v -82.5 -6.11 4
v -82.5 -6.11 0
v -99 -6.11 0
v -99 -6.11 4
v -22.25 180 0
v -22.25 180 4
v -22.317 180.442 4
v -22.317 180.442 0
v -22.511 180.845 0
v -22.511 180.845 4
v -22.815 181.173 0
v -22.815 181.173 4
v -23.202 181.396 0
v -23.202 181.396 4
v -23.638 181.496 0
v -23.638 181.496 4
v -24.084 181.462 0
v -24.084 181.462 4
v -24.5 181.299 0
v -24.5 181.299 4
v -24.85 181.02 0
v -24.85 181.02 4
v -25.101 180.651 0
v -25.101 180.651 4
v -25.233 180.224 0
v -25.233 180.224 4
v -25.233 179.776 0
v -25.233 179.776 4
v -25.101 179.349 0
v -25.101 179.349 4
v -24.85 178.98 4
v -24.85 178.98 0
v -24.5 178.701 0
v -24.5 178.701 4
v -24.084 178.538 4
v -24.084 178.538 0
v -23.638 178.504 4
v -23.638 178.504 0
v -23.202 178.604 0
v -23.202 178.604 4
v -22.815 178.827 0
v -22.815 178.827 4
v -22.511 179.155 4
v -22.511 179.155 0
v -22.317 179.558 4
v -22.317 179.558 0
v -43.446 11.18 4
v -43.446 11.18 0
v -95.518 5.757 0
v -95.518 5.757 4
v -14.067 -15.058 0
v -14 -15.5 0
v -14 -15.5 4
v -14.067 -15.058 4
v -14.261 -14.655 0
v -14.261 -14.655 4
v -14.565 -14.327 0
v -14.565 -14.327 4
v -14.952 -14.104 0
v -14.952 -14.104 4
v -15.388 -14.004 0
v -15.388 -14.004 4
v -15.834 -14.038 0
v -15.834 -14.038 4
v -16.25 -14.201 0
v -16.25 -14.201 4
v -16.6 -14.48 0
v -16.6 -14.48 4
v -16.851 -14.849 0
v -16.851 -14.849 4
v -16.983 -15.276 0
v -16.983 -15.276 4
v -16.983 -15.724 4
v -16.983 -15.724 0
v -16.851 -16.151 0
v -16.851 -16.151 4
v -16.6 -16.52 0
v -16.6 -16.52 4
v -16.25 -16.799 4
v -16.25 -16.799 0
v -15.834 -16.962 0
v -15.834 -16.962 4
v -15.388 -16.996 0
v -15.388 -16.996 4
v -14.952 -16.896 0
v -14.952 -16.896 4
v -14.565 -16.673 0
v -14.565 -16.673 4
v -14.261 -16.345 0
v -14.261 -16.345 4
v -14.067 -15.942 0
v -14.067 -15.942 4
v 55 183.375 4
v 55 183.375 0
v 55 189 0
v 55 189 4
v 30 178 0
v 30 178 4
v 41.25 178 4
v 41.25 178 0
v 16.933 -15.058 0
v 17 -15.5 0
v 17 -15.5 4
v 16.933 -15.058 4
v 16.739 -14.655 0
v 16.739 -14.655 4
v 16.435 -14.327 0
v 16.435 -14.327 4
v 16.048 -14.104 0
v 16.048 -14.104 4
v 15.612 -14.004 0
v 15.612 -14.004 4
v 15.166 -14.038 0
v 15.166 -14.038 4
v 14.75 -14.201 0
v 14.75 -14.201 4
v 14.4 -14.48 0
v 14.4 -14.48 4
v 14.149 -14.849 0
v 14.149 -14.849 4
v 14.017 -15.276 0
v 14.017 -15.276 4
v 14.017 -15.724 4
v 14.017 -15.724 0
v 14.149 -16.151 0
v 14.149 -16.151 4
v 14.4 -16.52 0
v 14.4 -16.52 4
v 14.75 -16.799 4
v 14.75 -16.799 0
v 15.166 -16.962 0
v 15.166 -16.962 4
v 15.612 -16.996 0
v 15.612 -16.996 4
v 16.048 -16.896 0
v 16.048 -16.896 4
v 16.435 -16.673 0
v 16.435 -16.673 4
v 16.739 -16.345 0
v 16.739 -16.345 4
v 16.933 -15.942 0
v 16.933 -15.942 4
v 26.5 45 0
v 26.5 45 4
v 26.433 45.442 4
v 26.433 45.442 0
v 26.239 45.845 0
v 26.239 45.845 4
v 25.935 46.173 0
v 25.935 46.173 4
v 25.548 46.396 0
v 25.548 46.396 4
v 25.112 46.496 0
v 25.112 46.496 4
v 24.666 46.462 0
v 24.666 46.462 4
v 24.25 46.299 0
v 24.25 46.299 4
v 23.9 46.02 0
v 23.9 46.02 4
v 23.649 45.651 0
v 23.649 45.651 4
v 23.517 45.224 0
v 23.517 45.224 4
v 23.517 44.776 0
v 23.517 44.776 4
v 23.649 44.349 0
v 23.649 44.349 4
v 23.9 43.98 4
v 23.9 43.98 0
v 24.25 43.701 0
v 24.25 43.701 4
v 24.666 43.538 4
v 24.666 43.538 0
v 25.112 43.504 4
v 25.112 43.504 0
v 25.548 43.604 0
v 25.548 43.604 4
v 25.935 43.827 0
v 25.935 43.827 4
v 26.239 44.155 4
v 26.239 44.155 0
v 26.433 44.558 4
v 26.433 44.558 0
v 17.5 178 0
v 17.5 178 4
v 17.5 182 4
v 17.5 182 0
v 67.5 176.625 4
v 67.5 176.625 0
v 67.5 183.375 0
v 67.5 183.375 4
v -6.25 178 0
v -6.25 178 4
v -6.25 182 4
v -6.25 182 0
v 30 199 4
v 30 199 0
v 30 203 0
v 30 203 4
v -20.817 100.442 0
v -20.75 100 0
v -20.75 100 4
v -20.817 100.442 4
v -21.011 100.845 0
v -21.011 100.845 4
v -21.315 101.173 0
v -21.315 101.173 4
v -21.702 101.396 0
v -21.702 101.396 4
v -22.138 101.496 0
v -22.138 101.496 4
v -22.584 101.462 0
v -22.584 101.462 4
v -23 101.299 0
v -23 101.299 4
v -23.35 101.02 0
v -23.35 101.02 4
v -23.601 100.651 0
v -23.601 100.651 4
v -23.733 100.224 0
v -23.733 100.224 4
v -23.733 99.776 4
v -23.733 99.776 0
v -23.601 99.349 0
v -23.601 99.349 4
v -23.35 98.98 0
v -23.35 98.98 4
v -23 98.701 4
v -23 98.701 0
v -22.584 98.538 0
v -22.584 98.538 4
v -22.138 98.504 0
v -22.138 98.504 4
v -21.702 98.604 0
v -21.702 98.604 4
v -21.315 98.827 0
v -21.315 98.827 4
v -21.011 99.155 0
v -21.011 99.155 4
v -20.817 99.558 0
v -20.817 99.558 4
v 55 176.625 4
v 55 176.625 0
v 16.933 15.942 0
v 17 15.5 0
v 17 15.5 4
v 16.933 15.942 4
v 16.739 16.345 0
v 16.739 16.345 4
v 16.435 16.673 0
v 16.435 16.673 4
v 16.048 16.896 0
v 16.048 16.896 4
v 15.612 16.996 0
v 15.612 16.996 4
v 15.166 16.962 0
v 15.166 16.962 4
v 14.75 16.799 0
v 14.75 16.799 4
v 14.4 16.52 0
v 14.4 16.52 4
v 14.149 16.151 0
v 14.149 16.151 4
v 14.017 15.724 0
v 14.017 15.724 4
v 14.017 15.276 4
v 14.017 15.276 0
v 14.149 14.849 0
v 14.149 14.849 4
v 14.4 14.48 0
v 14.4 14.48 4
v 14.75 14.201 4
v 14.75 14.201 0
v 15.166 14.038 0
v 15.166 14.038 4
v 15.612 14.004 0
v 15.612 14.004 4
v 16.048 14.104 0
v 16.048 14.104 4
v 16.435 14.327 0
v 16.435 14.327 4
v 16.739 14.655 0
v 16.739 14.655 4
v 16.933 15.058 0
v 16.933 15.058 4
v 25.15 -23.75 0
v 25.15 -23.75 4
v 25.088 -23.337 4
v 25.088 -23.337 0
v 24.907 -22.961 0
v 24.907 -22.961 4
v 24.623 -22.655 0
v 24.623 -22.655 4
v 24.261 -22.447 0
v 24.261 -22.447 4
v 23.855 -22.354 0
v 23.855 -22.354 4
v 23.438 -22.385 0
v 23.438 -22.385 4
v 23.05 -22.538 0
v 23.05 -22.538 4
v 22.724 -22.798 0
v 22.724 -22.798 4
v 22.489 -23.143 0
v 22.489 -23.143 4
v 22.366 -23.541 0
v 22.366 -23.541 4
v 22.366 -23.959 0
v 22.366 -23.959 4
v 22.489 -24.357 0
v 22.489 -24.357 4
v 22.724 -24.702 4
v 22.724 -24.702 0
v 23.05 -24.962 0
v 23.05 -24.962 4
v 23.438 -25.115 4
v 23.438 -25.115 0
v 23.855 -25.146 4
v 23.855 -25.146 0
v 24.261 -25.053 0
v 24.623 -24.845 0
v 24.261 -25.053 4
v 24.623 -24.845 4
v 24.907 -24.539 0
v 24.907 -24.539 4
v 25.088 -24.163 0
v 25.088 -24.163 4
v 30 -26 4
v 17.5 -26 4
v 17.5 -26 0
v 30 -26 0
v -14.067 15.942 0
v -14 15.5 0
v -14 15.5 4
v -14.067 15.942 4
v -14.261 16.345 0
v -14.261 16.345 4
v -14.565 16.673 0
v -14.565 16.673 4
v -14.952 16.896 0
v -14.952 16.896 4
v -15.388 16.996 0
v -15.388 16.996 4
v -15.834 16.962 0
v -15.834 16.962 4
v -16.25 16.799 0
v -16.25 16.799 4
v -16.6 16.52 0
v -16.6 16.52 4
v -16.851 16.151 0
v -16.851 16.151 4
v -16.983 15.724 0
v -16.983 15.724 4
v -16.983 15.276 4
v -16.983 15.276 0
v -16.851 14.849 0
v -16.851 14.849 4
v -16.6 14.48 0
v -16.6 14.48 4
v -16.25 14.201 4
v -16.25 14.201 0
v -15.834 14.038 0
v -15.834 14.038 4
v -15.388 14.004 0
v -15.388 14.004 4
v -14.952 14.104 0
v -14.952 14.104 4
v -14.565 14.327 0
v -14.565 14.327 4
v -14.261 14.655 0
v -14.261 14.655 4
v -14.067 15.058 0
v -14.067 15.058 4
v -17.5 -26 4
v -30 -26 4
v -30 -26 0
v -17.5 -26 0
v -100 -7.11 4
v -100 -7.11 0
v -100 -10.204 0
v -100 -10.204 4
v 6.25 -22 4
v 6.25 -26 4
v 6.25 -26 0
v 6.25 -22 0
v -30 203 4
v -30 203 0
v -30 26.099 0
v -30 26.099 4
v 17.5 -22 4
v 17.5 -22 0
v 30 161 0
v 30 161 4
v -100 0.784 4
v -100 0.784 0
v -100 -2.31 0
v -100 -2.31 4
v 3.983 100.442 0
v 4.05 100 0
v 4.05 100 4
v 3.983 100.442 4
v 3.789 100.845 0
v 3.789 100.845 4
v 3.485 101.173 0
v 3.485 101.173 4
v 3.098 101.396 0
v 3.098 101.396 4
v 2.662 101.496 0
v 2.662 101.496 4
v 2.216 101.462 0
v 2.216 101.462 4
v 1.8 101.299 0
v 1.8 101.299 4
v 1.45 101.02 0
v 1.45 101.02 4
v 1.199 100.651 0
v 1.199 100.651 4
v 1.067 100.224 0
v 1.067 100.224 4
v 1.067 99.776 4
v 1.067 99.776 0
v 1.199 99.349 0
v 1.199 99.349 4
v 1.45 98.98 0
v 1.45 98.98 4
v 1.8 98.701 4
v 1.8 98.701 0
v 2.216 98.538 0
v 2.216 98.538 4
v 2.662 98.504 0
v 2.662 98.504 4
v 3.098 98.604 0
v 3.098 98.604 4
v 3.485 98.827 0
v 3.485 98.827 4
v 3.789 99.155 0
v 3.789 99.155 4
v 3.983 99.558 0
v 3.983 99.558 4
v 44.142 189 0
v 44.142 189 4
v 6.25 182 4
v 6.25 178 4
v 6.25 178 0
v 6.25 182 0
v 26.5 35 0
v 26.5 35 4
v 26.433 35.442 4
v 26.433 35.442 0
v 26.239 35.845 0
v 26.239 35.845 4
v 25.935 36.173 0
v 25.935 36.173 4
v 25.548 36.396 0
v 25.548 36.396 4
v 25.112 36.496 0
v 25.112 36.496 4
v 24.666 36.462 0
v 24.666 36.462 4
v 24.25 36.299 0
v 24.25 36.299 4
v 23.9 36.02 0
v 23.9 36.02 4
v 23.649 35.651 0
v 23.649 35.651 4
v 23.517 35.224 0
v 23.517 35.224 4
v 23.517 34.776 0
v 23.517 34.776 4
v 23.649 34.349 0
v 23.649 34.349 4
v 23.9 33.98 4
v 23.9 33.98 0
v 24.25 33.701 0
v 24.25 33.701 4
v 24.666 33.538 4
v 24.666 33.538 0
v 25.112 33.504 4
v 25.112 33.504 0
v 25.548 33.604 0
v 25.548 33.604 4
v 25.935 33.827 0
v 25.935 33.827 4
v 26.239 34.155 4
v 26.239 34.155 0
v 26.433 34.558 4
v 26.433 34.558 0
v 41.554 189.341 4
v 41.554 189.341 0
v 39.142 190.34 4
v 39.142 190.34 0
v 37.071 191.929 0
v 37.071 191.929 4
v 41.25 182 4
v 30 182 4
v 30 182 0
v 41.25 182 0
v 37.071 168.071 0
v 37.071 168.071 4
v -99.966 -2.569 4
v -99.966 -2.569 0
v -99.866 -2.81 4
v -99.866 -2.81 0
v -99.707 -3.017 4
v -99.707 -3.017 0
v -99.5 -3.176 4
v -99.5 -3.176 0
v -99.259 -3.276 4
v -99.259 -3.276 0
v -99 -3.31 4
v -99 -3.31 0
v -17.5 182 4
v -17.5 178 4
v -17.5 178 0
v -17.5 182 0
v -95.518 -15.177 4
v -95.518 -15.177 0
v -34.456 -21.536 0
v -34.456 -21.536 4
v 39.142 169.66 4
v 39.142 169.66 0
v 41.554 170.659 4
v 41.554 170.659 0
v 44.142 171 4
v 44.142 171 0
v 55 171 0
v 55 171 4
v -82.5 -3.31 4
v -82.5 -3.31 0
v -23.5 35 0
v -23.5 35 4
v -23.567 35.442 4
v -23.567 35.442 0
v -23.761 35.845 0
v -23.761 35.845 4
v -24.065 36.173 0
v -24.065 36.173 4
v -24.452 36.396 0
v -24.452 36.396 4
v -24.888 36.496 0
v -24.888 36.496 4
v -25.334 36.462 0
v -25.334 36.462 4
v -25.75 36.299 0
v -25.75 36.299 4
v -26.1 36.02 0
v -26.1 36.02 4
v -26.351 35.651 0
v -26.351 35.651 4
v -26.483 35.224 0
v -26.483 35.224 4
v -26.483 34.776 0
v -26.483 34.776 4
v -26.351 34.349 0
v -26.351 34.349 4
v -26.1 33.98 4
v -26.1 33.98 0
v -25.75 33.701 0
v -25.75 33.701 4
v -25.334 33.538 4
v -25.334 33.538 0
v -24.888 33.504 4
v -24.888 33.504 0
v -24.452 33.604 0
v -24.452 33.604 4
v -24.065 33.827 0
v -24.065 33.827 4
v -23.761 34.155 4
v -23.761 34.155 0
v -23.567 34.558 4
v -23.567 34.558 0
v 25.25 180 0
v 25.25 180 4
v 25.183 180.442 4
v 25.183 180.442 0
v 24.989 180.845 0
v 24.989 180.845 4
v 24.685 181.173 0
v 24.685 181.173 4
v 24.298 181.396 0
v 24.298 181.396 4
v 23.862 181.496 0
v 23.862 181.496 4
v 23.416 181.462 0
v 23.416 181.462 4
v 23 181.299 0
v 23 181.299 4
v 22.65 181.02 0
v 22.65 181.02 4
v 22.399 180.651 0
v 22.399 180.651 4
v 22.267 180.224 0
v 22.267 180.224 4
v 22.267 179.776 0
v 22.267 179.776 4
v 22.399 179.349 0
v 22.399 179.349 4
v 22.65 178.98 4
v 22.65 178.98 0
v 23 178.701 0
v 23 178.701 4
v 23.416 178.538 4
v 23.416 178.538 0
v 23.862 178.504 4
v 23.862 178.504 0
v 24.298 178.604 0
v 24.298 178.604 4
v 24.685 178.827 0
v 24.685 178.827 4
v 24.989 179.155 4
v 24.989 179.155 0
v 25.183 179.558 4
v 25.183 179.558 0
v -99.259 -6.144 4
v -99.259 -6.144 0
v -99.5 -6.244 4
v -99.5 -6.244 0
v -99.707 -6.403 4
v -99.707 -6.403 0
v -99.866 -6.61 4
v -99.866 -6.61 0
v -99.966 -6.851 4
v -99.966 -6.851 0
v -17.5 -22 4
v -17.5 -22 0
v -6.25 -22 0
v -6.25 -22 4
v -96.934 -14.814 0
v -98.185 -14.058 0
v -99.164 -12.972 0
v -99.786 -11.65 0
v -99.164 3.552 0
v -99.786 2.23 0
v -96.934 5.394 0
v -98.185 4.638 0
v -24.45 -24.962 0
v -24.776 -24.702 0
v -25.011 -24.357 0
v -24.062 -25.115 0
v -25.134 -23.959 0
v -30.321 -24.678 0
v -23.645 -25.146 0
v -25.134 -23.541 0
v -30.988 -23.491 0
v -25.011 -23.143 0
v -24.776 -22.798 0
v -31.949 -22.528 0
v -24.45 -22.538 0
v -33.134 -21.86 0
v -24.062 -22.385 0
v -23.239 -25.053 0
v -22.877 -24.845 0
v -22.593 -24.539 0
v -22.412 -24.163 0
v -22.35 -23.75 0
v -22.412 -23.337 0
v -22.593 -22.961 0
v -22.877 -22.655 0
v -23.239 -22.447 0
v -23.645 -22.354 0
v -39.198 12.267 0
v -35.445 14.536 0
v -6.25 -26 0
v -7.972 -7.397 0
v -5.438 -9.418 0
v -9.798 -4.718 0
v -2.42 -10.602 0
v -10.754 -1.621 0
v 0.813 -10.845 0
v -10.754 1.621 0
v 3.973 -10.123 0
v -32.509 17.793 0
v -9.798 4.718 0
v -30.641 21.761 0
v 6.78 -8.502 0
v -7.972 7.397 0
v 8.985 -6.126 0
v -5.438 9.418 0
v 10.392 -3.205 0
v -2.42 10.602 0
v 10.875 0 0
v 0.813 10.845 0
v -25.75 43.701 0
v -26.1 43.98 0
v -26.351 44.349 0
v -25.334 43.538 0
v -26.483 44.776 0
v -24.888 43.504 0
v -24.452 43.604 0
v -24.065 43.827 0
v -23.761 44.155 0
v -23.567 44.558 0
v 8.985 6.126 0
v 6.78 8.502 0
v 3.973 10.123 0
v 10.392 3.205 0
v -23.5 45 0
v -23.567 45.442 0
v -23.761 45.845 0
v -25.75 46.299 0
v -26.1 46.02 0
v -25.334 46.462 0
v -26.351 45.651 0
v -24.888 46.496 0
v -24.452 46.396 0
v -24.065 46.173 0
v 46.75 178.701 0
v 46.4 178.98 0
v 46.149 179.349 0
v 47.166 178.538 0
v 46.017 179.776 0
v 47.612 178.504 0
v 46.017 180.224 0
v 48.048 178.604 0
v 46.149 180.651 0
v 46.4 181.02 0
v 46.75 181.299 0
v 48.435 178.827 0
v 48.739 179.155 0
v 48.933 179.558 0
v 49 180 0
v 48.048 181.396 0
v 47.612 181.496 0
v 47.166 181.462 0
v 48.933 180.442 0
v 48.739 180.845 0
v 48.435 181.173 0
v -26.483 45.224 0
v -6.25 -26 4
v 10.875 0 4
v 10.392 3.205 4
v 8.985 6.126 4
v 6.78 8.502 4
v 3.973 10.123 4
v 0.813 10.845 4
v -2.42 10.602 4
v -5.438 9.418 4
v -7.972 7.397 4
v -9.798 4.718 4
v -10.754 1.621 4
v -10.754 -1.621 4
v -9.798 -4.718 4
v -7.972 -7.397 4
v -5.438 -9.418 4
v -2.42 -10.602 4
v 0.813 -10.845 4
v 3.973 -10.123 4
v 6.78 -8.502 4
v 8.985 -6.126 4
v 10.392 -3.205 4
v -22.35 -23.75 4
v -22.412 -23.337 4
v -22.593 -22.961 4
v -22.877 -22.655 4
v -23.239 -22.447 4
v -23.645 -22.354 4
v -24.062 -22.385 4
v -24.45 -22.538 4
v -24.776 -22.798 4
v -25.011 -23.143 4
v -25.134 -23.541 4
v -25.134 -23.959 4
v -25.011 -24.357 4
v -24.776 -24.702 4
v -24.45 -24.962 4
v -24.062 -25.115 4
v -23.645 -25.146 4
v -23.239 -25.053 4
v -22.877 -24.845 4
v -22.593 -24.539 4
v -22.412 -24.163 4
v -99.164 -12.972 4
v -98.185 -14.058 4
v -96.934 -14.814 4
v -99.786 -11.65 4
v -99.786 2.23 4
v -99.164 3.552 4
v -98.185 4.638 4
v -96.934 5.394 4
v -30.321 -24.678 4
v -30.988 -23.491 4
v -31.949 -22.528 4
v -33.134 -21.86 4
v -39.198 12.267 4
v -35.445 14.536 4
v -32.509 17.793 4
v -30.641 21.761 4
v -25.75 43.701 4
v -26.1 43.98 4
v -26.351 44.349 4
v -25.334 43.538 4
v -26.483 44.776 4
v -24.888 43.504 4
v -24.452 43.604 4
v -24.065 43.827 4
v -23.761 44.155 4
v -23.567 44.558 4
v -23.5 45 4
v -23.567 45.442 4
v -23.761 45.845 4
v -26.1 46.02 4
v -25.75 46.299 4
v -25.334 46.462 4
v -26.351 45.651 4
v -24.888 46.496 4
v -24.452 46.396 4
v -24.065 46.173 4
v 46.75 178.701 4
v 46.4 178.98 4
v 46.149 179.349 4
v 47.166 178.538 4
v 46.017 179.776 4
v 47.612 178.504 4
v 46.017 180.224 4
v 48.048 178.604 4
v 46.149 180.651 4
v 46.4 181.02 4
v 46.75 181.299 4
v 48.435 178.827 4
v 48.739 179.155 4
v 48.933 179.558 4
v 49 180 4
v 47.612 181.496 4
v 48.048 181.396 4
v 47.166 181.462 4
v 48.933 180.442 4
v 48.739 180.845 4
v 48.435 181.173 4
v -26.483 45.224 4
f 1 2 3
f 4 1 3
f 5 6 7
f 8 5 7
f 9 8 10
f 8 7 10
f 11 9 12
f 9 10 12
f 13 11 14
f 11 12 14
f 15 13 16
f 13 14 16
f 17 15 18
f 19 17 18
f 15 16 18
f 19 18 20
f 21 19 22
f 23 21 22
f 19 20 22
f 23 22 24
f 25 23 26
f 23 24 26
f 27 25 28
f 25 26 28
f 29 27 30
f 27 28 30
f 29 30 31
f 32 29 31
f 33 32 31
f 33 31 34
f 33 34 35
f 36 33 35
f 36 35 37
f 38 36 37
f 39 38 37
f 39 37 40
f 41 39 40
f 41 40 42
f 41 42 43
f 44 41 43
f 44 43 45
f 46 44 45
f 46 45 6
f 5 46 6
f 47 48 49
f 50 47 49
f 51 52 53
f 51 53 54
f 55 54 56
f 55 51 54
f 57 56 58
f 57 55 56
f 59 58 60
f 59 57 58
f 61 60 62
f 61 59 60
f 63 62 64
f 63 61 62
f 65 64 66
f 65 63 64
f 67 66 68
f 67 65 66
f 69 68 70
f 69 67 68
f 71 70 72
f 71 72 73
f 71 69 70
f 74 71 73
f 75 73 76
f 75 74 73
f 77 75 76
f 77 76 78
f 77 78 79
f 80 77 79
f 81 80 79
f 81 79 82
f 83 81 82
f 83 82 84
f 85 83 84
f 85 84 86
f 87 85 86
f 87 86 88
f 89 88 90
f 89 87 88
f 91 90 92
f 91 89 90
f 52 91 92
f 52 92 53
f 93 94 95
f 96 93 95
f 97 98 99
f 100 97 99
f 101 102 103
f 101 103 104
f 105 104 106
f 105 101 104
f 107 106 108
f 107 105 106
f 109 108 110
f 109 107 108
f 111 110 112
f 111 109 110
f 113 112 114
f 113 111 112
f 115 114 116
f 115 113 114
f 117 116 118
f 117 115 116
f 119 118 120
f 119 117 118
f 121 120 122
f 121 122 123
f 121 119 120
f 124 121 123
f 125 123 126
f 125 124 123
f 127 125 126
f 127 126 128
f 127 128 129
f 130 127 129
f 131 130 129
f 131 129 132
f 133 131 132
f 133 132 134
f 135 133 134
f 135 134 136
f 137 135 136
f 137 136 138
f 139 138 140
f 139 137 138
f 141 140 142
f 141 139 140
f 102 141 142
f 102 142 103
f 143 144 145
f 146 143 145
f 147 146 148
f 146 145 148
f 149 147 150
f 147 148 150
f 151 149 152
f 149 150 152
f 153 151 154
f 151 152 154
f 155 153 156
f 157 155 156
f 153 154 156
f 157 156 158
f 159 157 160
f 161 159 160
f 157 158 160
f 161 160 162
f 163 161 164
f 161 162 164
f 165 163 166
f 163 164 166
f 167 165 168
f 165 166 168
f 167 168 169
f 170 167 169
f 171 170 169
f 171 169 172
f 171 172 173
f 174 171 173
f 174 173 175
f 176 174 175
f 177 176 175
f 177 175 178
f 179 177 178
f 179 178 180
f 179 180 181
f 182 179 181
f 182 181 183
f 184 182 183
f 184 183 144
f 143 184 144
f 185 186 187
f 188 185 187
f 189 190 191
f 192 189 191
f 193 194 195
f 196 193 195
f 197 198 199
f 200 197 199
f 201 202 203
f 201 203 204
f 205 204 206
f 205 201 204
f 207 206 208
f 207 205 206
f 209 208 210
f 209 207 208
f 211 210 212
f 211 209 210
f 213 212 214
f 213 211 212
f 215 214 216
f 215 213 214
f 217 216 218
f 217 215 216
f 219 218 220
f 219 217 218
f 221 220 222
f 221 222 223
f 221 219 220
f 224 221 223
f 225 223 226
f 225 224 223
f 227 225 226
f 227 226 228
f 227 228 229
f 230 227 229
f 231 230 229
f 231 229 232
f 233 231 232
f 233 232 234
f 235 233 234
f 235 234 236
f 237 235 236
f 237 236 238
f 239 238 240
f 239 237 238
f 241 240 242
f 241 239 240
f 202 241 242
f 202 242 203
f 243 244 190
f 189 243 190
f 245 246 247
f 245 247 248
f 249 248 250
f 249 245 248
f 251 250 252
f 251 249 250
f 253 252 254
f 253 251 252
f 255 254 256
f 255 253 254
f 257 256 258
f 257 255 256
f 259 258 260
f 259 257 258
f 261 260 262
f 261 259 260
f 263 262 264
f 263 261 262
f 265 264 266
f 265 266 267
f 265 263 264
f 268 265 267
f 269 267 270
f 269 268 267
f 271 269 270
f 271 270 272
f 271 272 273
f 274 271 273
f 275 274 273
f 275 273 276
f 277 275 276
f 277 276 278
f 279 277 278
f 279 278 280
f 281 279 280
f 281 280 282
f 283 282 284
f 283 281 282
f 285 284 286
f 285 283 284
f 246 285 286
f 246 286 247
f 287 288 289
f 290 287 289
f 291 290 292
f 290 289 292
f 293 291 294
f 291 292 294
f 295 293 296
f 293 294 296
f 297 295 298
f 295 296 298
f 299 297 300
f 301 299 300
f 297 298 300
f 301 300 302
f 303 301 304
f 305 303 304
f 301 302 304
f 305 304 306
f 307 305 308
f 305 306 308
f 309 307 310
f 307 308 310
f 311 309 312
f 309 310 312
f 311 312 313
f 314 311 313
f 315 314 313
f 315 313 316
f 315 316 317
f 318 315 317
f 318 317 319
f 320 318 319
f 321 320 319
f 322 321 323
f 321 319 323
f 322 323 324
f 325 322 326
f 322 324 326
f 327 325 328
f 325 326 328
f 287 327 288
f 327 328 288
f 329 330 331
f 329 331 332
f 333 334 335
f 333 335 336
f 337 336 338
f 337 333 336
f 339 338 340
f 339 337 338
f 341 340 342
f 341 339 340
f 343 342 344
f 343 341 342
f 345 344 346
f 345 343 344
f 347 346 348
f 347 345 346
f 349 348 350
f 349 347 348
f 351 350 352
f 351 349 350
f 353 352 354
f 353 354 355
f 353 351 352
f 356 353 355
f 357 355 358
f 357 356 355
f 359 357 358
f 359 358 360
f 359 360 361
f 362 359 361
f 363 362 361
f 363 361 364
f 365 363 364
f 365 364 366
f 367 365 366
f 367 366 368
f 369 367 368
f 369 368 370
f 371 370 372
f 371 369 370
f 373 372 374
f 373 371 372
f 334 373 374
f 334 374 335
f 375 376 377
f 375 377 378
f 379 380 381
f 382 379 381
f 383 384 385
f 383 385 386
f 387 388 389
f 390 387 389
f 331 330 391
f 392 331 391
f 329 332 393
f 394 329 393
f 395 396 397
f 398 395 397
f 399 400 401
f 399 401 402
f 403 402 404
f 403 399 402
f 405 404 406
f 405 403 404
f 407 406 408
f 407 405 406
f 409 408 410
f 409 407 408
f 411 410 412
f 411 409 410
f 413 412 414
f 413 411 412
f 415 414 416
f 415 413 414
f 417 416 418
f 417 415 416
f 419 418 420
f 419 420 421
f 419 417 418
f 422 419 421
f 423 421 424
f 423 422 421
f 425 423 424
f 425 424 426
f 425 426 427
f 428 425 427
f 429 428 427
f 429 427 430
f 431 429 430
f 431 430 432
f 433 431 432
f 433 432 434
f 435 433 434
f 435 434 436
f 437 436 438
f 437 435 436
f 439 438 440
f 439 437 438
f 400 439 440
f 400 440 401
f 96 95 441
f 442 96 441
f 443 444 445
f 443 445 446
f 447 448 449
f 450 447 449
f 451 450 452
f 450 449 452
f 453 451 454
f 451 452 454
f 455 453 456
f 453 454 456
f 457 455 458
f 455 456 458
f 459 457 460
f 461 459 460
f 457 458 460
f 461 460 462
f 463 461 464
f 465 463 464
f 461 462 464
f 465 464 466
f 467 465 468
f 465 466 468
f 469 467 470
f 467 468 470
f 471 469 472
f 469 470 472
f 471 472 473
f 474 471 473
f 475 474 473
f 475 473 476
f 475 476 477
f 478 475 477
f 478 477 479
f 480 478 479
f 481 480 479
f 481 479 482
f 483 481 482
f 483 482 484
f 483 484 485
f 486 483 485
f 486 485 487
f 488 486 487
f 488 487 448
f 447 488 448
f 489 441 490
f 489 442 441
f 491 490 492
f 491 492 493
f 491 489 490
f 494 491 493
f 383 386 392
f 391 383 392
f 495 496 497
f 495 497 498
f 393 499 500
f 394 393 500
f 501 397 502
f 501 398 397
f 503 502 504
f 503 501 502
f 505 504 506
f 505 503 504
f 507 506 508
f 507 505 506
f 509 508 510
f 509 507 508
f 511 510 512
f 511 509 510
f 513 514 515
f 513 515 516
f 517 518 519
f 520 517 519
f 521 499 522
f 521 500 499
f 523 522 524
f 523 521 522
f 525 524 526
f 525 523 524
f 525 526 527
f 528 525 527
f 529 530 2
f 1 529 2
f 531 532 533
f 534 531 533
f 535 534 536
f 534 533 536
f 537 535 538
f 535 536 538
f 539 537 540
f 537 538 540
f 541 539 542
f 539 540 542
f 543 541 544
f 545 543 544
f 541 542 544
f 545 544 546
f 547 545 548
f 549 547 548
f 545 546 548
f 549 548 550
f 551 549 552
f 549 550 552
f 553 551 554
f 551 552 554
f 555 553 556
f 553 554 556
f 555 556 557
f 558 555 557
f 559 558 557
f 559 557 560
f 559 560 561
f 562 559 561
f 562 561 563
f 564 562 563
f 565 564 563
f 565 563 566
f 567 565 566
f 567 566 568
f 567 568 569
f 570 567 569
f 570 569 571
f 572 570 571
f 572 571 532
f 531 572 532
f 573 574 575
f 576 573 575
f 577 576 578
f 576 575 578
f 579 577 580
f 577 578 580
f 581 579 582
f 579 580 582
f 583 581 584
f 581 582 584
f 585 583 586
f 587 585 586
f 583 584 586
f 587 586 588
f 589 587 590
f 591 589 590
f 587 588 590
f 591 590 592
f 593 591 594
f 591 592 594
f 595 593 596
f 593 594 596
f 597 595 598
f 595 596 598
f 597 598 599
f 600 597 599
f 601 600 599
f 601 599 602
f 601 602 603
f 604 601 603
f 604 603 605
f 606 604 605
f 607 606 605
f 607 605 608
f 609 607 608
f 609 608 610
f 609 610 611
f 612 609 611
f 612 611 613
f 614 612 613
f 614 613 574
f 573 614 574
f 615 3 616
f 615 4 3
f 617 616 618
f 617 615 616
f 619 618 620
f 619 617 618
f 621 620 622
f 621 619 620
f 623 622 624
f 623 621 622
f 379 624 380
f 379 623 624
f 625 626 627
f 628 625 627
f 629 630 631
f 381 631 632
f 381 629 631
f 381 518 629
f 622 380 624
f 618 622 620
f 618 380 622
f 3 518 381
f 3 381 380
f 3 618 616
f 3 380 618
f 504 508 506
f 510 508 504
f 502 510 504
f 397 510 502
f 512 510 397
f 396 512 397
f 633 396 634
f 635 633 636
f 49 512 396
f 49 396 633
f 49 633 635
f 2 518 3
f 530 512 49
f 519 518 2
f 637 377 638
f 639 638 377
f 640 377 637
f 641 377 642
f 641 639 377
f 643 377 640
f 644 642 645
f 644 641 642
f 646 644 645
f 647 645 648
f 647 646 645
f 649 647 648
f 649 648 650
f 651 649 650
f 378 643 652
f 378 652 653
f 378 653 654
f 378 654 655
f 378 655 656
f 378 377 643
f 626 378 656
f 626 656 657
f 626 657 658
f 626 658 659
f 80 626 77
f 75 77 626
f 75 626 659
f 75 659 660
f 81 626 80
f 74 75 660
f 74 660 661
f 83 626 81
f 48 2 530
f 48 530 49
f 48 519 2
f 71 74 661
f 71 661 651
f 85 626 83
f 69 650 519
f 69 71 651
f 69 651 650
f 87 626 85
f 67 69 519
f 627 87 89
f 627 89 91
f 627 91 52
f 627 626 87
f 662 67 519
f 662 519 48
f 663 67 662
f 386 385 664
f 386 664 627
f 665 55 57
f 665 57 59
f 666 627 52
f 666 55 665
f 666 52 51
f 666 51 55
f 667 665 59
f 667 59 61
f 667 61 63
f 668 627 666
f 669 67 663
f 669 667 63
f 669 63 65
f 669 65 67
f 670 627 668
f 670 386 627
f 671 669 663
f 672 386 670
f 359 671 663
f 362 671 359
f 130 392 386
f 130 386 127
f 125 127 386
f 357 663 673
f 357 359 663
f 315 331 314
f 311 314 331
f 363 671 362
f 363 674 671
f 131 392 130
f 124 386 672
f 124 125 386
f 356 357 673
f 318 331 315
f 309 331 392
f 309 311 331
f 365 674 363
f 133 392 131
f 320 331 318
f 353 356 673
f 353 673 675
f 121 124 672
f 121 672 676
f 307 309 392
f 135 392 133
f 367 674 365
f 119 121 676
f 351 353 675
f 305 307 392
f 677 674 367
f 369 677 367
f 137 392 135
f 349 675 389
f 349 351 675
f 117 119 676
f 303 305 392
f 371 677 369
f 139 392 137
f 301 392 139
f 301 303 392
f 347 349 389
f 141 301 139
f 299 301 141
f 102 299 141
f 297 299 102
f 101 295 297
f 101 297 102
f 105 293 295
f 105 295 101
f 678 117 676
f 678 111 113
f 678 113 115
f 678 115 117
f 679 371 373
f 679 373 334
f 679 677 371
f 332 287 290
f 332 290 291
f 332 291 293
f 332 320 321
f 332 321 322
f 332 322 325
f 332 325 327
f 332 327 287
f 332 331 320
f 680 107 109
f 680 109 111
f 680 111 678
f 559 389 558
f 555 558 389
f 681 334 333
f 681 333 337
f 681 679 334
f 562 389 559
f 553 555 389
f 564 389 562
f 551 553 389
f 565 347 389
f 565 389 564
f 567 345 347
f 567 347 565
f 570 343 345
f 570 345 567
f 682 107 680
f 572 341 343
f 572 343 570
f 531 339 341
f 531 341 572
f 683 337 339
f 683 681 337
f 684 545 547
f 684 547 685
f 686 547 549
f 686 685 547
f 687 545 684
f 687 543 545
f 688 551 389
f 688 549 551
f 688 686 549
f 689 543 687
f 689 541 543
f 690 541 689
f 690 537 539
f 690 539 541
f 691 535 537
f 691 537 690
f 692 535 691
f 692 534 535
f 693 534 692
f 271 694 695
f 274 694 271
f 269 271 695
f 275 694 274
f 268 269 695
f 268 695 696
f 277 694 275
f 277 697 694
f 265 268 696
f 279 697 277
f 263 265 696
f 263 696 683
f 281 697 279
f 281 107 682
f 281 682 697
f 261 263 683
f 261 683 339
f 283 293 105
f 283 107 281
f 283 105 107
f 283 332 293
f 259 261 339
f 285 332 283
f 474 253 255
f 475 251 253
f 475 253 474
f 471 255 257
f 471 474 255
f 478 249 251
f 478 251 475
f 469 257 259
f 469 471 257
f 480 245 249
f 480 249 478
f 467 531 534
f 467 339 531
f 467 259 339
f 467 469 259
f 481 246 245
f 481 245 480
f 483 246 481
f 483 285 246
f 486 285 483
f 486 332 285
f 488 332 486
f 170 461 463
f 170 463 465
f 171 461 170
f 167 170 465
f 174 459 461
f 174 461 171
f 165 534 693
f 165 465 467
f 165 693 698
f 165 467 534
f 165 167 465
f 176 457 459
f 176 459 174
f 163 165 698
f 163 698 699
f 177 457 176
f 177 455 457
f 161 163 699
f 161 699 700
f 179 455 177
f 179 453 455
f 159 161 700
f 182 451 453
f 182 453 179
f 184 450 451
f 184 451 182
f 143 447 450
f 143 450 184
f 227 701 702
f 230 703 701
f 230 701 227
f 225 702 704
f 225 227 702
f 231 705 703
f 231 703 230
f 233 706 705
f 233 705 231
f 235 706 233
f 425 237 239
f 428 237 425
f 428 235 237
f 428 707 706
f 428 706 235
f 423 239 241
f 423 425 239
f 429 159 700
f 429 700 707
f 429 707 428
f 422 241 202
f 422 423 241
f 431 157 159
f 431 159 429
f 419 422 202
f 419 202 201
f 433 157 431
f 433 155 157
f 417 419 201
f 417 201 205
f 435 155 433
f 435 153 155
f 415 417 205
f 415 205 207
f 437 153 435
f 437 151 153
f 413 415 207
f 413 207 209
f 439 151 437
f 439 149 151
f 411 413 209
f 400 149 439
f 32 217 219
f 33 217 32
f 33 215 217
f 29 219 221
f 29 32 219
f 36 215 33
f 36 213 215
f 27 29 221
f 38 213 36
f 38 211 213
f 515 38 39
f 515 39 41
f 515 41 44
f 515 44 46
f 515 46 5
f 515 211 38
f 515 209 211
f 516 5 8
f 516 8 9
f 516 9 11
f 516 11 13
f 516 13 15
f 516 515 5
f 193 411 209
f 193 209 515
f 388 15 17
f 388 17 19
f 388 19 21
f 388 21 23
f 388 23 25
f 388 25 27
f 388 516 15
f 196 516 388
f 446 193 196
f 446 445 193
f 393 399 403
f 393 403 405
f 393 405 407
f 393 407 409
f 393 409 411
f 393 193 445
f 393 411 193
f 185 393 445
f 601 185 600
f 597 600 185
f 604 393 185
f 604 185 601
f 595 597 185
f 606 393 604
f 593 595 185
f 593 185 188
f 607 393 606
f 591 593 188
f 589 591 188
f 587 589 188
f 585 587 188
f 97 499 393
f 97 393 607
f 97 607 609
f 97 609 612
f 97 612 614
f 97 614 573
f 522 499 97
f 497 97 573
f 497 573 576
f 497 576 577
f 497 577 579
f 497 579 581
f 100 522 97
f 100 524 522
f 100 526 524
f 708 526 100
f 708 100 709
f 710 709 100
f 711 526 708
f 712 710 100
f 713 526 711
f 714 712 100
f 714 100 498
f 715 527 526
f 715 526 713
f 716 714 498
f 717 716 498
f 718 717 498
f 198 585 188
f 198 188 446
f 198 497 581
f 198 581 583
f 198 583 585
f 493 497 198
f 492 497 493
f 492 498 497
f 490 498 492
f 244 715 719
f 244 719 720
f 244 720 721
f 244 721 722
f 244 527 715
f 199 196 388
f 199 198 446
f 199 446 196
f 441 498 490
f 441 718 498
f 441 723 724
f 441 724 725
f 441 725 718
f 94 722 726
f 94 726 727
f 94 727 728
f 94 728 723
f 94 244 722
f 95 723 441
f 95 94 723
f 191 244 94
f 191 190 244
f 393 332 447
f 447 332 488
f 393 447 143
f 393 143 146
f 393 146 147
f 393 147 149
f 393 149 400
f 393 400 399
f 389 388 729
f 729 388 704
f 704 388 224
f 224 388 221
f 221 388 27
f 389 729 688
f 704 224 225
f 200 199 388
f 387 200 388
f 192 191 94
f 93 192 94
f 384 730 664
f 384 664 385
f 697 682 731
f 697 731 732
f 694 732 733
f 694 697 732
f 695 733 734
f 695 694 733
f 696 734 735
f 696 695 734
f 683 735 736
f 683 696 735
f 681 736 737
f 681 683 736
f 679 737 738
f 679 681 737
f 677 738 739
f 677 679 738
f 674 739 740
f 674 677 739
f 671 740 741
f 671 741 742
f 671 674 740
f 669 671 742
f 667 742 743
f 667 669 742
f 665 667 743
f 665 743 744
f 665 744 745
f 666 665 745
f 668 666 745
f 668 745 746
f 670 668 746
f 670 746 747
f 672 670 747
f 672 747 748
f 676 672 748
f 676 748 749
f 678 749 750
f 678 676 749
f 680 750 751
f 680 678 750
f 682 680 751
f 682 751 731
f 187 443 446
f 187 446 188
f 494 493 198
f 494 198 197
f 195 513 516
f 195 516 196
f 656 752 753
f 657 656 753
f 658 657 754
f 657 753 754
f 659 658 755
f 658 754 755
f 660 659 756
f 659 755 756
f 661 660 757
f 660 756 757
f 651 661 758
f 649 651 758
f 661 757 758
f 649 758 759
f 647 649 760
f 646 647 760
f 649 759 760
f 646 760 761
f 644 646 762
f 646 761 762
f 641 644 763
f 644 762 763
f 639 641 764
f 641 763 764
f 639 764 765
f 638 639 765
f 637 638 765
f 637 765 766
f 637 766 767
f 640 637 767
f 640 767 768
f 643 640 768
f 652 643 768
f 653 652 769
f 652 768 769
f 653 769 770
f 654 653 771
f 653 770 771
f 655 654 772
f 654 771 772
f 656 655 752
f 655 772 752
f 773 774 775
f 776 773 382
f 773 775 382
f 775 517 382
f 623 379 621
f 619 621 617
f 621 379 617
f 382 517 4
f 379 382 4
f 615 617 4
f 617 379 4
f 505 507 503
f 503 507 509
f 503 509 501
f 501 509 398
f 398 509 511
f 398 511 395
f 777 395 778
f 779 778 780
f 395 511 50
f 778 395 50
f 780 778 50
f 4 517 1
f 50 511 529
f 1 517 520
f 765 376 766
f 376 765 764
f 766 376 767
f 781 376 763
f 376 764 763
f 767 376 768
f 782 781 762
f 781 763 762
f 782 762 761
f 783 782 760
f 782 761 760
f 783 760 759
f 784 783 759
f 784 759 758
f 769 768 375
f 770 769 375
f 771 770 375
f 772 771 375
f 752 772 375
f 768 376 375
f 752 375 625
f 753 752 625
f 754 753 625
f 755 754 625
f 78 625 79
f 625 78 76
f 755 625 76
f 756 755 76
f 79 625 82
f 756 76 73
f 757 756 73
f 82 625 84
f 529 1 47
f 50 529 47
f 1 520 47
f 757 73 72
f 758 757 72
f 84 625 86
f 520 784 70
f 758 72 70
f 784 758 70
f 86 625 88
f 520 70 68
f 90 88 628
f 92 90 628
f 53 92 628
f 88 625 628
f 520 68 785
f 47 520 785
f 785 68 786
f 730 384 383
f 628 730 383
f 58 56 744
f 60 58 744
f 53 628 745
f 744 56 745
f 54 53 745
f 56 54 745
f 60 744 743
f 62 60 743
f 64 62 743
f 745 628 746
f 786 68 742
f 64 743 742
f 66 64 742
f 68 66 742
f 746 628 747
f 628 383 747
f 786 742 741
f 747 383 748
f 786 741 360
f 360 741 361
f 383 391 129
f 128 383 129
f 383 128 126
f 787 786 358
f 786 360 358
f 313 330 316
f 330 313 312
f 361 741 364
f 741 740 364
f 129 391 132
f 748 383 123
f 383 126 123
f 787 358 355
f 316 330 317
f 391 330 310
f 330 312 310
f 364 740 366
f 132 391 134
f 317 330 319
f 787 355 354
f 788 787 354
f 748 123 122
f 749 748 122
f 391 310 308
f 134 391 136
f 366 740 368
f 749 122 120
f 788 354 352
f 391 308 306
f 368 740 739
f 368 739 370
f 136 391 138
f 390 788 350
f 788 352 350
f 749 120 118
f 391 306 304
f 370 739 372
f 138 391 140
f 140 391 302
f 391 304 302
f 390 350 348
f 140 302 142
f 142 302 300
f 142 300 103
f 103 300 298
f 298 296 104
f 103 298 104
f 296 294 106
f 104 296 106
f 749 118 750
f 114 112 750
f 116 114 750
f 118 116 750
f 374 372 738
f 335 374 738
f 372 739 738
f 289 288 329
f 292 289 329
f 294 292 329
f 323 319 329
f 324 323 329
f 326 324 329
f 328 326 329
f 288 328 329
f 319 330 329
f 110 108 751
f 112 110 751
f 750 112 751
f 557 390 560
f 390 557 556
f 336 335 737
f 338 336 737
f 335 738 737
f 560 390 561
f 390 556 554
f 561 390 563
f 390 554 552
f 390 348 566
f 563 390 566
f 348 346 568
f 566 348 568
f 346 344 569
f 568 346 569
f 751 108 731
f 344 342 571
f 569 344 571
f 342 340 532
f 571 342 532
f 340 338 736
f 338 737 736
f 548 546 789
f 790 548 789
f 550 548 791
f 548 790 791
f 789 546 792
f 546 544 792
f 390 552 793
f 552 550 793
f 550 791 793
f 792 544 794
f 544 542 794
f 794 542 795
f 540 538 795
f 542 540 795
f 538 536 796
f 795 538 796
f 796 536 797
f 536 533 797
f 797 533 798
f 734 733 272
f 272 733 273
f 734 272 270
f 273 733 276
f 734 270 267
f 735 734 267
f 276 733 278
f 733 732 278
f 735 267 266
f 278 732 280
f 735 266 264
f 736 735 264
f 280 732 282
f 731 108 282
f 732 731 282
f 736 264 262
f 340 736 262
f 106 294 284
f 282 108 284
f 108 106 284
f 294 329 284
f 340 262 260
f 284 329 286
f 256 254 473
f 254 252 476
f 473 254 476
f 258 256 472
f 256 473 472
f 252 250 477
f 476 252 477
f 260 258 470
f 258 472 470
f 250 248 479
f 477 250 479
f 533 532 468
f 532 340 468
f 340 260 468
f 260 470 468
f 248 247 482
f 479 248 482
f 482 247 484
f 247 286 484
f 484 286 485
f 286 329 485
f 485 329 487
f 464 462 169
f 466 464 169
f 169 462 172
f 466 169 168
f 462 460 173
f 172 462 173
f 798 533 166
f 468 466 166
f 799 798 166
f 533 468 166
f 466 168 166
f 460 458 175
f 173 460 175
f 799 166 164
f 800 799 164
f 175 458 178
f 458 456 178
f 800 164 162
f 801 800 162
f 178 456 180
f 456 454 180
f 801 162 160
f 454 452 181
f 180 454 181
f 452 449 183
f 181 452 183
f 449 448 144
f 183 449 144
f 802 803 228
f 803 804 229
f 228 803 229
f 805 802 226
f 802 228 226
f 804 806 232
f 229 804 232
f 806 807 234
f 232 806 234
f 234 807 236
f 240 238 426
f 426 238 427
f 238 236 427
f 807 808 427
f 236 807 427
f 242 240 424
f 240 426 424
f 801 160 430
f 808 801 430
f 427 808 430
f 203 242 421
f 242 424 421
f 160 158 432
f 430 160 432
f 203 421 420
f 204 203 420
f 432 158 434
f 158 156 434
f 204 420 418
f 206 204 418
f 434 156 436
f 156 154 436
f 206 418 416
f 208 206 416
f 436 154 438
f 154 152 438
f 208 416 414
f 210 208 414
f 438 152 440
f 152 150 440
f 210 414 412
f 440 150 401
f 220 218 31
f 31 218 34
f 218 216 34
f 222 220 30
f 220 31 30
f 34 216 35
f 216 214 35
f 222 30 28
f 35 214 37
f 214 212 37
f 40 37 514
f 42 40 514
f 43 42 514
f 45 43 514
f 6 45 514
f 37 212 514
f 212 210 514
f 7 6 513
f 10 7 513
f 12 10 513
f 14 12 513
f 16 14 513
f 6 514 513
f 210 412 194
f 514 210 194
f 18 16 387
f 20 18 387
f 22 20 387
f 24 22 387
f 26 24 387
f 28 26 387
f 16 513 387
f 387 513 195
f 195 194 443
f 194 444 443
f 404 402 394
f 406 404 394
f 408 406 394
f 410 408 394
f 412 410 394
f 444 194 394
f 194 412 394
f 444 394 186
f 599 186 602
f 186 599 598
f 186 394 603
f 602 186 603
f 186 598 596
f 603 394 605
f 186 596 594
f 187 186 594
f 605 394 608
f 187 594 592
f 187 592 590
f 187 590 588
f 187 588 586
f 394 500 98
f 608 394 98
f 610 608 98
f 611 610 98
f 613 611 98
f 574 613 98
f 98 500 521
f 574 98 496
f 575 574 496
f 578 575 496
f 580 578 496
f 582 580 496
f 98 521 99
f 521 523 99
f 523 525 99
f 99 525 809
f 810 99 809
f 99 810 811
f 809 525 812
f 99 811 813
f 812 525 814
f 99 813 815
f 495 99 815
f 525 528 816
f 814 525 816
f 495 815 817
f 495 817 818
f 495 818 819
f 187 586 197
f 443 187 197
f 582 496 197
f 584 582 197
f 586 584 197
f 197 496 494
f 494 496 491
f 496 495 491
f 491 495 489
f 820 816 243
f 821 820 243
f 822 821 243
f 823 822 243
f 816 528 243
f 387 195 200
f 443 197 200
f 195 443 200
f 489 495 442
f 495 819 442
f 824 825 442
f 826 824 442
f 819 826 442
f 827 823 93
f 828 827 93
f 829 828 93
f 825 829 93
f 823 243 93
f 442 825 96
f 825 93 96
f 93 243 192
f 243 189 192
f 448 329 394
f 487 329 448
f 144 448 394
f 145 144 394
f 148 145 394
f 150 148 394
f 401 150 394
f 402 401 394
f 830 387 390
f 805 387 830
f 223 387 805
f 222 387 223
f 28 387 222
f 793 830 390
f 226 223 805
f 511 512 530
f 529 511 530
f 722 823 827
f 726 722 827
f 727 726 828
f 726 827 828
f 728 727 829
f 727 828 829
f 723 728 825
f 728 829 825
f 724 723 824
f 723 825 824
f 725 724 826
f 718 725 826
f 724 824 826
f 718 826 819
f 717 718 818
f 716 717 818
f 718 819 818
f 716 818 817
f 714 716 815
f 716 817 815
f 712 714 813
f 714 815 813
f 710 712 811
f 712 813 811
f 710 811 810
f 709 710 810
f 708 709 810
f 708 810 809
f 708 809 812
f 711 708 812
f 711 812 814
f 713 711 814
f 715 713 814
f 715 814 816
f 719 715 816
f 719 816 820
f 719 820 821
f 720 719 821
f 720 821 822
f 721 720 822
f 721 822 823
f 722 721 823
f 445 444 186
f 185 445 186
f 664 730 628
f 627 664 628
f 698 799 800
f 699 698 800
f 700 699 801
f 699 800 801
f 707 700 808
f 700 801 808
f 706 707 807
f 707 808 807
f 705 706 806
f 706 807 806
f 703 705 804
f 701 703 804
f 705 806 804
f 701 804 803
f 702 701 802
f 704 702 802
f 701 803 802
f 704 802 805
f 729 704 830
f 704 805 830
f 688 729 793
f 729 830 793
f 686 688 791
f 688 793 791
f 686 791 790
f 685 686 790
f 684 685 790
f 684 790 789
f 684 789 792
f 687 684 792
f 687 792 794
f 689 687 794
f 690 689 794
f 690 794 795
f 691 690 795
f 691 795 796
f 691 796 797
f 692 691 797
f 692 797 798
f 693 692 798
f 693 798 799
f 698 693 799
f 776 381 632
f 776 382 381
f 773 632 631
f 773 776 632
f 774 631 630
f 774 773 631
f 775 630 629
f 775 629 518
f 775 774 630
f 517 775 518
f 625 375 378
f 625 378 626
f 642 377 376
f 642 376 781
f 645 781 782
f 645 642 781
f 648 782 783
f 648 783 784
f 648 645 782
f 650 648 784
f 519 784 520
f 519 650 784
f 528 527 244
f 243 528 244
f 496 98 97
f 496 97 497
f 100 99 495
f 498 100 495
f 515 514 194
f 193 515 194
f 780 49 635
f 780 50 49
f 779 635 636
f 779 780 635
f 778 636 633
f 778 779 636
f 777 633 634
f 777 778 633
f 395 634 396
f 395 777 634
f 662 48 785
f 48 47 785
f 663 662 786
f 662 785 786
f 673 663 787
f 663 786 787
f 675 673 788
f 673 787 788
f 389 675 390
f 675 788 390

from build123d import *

# Parameters (mm, degrees)
SKETCH_1_R          = 1.5
SKETCH_1_R_2        = 10.875
EXTRUDE_1_DEPTH     = 4
FILLET_3_R          = 15
FILLET_4_R          = 5
FILLET_5_R          = 1
SKETCH_2_W          = 12.5
SKETCH_2_H          = 4
SKETCH_2_R          = 1.4
EXTRUDE_2_DEPTH     = 4
FILLET_6_R          = 5
SKETCH_4_R          = 1.5
SKETCH_4_W          = 11.25
SKETCH_4_H          = 4
CUT_EXTRUDE_2_DEPTH = 227.329405955
CHAMFER_1_SIZE      = 10
FILLET_7_R          = 10
SKETCH_3_R          = 1.5
CUT_EXTRUDE_1_DEPTH = 227.329405955


with BuildPart() as part:
    # Эскиз1 → Бобышка-Вытянуть1 (new body)
    with BuildSketch(Plane.XY):
        Polygon((-100, -14.71), (-30, -22), (30, -22), (30, 171), (55, 171), (55, 176.625), (67.5, 176.625), (67.5, 183.375), (55, 183.375), (55, 189), (30, 189), (30, 203), (-30, 203), (-30, 12.58), (-100, 5.29), (-100, -3.31), (-82.5, -3.31), (-82.5, -6.11), (-100, -6.11), align=None)
        with Locations((-15.5, -15.5)):
            Circle(SKETCH_1_R, mode=Mode.SUBTRACT)
        Circle(SKETCH_1_R_2, mode=Mode.SUBTRACT)
        with Locations((15.5, -15.5)):
            Circle(SKETCH_1_R, mode=Mode.SUBTRACT)
        with Locations((-15.5, 15.5)):
            Circle(SKETCH_1_R, mode=Mode.SUBTRACT)
        with Locations((15.5, 15.5)):
            Circle(SKETCH_1_R, mode=Mode.SUBTRACT)
        with Locations((-22.25, 100)):
            Circle(SKETCH_1_R, mode=Mode.SUBTRACT)
        with Locations((2.55, 100)):
            Circle(SKETCH_1_R, mode=Mode.SUBTRACT)
    extrude(amount=EXTRUDE_1_DEPTH)

    # Скругление3
    fillet_3_edges = [part.edges().sort_by_distance(p)[0] for p in [
        (-30, 12.58, 2),
    ]]
    fillet(fillet_3_edges, radius=FILLET_3_R)

    # Скругление4
    fillet_4_edges = [part.edges().sort_by_distance(p)[0] for p in [
        (-100, -14.71, 2),
        (-100, 5.29, 2),
    ]]
    fillet(fillet_4_edges, radius=FILLET_4_R)

    # Скругление5
    fillet_5_edges = [part.edges().sort_by_distance(p)[0] for p in [
        (-100, -6.11, 2),
        (-100, -3.31, 2),
    ]]
    fillet(fillet_5_edges, radius=FILLET_5_R)

    # Эскиз2 → Бобышка-Вытянуть2 (add, through all)
    # profile 1 of 3: a face of its own
    with BuildSketch(Plane.XY.offset(4)):
        with Locations((-23.75, -24)):
            Rectangle(SKETCH_2_W, SKETCH_2_H)
        with Locations((-23.75, -23.75)):
            Circle(SKETCH_2_R, mode=Mode.SUBTRACT)
    # profile 2 of 3: a face of its own
    with BuildSketch(Plane.XY.offset(4)):
        with Locations((0, -24)):
            Rectangle(SKETCH_2_W, SKETCH_2_H)
    # profile 3 of 3: a face of its own
    with BuildSketch(Plane.XY.offset(4)):
        with Locations((23.75, -24)):
            Rectangle(SKETCH_2_W, SKETCH_2_H)
        with Locations((23.75, -23.75)):
            Circle(SKETCH_2_R, mode=Mode.SUBTRACT)
    extrude(amount=-EXTRUDE_2_DEPTH)

    # Скругление6
    # the kernel refuses this fillet: 5 mm, written as the material it adds along each edge
    with BuildSketch(Plane(origin=(-30, -22, 0), x_dir=(0, -1, 0), z_dir=(0, 0, 1))) as fillet_6_piece_1:
        with BuildLine():
            CenterArc((4.509032444, -4.974021107), FILLET_6_R, 95.843205651, 78.21128084)
            Line((-0.4640718, -4.456107822), (-0.563533885, -4.445749556))
            Line((-0.563533885, -4.445749556), (-0.099462085, 0.010358266))
            Line((-0.099462085, 0.010358266), (0, 0.1))
            ThreePointArc((0, 0.1), (2, 0.1), (3.989819351, 0.099480422))
            Line((3.989819351, 0.099480422), (4, 0))
        make_face()
    extrude(amount=4)

    # Эскиз4 → Вырез-Вытянуть2 (cut, through all)
    with BuildSketch(Plane.XY.offset(4)):
        with Locations((23.75, 180)):
            Circle(SKETCH_4_R)
        with Locations((-23.75, 180)):
            Circle(SKETCH_4_R)
        with Locations((-11.875, 180)):
            Rectangle(SKETCH_4_W, SKETCH_4_H)
        with Locations((11.875, 180)):
            Rectangle(SKETCH_4_W, SKETCH_4_H)
        with Locations((35.625, 180)):
            Rectangle(SKETCH_4_W, SKETCH_4_H)
        with Locations((47.5, 180)):
            Circle(SKETCH_4_R)
    extrude(amount=-CUT_EXTRUDE_2_DEPTH, mode=Mode.SUBTRACT)

    # Фаска1
    chamfer_1_edges = [part.edges().sort_by_distance(p)[0] for p in [
        (30, 171, 2),
        (30, 189, 2),
    ]]
    chamfer(chamfer_1_edges, length=CHAMFER_1_SIZE)

    # Скругление7
    fillet_7_edges = [part.edges().sort_by_distance(p)[0] for p in [
        (40, 171, 2),
        (40, 189, 2),
    ]]
    fillet(fillet_7_edges, radius=FILLET_7_R)

    # Эскиз3 → Вырез-Вытянуть1 (cut, through all)
    with BuildSketch(Plane.XY.offset(4)):
        with Locations((-25, 45)):
            Circle(SKETCH_3_R)
        with Locations((25, 45)):
            Circle(SKETCH_3_R)
        with Locations((-25, 35)):
            Circle(SKETCH_3_R)
        with Locations((25, 35)):
            Circle(SKETCH_3_R)
    extrude(amount=-CUT_EXTRUDE_1_DEPTH, mode=Mode.SUBTRACT)


solid = part.part
